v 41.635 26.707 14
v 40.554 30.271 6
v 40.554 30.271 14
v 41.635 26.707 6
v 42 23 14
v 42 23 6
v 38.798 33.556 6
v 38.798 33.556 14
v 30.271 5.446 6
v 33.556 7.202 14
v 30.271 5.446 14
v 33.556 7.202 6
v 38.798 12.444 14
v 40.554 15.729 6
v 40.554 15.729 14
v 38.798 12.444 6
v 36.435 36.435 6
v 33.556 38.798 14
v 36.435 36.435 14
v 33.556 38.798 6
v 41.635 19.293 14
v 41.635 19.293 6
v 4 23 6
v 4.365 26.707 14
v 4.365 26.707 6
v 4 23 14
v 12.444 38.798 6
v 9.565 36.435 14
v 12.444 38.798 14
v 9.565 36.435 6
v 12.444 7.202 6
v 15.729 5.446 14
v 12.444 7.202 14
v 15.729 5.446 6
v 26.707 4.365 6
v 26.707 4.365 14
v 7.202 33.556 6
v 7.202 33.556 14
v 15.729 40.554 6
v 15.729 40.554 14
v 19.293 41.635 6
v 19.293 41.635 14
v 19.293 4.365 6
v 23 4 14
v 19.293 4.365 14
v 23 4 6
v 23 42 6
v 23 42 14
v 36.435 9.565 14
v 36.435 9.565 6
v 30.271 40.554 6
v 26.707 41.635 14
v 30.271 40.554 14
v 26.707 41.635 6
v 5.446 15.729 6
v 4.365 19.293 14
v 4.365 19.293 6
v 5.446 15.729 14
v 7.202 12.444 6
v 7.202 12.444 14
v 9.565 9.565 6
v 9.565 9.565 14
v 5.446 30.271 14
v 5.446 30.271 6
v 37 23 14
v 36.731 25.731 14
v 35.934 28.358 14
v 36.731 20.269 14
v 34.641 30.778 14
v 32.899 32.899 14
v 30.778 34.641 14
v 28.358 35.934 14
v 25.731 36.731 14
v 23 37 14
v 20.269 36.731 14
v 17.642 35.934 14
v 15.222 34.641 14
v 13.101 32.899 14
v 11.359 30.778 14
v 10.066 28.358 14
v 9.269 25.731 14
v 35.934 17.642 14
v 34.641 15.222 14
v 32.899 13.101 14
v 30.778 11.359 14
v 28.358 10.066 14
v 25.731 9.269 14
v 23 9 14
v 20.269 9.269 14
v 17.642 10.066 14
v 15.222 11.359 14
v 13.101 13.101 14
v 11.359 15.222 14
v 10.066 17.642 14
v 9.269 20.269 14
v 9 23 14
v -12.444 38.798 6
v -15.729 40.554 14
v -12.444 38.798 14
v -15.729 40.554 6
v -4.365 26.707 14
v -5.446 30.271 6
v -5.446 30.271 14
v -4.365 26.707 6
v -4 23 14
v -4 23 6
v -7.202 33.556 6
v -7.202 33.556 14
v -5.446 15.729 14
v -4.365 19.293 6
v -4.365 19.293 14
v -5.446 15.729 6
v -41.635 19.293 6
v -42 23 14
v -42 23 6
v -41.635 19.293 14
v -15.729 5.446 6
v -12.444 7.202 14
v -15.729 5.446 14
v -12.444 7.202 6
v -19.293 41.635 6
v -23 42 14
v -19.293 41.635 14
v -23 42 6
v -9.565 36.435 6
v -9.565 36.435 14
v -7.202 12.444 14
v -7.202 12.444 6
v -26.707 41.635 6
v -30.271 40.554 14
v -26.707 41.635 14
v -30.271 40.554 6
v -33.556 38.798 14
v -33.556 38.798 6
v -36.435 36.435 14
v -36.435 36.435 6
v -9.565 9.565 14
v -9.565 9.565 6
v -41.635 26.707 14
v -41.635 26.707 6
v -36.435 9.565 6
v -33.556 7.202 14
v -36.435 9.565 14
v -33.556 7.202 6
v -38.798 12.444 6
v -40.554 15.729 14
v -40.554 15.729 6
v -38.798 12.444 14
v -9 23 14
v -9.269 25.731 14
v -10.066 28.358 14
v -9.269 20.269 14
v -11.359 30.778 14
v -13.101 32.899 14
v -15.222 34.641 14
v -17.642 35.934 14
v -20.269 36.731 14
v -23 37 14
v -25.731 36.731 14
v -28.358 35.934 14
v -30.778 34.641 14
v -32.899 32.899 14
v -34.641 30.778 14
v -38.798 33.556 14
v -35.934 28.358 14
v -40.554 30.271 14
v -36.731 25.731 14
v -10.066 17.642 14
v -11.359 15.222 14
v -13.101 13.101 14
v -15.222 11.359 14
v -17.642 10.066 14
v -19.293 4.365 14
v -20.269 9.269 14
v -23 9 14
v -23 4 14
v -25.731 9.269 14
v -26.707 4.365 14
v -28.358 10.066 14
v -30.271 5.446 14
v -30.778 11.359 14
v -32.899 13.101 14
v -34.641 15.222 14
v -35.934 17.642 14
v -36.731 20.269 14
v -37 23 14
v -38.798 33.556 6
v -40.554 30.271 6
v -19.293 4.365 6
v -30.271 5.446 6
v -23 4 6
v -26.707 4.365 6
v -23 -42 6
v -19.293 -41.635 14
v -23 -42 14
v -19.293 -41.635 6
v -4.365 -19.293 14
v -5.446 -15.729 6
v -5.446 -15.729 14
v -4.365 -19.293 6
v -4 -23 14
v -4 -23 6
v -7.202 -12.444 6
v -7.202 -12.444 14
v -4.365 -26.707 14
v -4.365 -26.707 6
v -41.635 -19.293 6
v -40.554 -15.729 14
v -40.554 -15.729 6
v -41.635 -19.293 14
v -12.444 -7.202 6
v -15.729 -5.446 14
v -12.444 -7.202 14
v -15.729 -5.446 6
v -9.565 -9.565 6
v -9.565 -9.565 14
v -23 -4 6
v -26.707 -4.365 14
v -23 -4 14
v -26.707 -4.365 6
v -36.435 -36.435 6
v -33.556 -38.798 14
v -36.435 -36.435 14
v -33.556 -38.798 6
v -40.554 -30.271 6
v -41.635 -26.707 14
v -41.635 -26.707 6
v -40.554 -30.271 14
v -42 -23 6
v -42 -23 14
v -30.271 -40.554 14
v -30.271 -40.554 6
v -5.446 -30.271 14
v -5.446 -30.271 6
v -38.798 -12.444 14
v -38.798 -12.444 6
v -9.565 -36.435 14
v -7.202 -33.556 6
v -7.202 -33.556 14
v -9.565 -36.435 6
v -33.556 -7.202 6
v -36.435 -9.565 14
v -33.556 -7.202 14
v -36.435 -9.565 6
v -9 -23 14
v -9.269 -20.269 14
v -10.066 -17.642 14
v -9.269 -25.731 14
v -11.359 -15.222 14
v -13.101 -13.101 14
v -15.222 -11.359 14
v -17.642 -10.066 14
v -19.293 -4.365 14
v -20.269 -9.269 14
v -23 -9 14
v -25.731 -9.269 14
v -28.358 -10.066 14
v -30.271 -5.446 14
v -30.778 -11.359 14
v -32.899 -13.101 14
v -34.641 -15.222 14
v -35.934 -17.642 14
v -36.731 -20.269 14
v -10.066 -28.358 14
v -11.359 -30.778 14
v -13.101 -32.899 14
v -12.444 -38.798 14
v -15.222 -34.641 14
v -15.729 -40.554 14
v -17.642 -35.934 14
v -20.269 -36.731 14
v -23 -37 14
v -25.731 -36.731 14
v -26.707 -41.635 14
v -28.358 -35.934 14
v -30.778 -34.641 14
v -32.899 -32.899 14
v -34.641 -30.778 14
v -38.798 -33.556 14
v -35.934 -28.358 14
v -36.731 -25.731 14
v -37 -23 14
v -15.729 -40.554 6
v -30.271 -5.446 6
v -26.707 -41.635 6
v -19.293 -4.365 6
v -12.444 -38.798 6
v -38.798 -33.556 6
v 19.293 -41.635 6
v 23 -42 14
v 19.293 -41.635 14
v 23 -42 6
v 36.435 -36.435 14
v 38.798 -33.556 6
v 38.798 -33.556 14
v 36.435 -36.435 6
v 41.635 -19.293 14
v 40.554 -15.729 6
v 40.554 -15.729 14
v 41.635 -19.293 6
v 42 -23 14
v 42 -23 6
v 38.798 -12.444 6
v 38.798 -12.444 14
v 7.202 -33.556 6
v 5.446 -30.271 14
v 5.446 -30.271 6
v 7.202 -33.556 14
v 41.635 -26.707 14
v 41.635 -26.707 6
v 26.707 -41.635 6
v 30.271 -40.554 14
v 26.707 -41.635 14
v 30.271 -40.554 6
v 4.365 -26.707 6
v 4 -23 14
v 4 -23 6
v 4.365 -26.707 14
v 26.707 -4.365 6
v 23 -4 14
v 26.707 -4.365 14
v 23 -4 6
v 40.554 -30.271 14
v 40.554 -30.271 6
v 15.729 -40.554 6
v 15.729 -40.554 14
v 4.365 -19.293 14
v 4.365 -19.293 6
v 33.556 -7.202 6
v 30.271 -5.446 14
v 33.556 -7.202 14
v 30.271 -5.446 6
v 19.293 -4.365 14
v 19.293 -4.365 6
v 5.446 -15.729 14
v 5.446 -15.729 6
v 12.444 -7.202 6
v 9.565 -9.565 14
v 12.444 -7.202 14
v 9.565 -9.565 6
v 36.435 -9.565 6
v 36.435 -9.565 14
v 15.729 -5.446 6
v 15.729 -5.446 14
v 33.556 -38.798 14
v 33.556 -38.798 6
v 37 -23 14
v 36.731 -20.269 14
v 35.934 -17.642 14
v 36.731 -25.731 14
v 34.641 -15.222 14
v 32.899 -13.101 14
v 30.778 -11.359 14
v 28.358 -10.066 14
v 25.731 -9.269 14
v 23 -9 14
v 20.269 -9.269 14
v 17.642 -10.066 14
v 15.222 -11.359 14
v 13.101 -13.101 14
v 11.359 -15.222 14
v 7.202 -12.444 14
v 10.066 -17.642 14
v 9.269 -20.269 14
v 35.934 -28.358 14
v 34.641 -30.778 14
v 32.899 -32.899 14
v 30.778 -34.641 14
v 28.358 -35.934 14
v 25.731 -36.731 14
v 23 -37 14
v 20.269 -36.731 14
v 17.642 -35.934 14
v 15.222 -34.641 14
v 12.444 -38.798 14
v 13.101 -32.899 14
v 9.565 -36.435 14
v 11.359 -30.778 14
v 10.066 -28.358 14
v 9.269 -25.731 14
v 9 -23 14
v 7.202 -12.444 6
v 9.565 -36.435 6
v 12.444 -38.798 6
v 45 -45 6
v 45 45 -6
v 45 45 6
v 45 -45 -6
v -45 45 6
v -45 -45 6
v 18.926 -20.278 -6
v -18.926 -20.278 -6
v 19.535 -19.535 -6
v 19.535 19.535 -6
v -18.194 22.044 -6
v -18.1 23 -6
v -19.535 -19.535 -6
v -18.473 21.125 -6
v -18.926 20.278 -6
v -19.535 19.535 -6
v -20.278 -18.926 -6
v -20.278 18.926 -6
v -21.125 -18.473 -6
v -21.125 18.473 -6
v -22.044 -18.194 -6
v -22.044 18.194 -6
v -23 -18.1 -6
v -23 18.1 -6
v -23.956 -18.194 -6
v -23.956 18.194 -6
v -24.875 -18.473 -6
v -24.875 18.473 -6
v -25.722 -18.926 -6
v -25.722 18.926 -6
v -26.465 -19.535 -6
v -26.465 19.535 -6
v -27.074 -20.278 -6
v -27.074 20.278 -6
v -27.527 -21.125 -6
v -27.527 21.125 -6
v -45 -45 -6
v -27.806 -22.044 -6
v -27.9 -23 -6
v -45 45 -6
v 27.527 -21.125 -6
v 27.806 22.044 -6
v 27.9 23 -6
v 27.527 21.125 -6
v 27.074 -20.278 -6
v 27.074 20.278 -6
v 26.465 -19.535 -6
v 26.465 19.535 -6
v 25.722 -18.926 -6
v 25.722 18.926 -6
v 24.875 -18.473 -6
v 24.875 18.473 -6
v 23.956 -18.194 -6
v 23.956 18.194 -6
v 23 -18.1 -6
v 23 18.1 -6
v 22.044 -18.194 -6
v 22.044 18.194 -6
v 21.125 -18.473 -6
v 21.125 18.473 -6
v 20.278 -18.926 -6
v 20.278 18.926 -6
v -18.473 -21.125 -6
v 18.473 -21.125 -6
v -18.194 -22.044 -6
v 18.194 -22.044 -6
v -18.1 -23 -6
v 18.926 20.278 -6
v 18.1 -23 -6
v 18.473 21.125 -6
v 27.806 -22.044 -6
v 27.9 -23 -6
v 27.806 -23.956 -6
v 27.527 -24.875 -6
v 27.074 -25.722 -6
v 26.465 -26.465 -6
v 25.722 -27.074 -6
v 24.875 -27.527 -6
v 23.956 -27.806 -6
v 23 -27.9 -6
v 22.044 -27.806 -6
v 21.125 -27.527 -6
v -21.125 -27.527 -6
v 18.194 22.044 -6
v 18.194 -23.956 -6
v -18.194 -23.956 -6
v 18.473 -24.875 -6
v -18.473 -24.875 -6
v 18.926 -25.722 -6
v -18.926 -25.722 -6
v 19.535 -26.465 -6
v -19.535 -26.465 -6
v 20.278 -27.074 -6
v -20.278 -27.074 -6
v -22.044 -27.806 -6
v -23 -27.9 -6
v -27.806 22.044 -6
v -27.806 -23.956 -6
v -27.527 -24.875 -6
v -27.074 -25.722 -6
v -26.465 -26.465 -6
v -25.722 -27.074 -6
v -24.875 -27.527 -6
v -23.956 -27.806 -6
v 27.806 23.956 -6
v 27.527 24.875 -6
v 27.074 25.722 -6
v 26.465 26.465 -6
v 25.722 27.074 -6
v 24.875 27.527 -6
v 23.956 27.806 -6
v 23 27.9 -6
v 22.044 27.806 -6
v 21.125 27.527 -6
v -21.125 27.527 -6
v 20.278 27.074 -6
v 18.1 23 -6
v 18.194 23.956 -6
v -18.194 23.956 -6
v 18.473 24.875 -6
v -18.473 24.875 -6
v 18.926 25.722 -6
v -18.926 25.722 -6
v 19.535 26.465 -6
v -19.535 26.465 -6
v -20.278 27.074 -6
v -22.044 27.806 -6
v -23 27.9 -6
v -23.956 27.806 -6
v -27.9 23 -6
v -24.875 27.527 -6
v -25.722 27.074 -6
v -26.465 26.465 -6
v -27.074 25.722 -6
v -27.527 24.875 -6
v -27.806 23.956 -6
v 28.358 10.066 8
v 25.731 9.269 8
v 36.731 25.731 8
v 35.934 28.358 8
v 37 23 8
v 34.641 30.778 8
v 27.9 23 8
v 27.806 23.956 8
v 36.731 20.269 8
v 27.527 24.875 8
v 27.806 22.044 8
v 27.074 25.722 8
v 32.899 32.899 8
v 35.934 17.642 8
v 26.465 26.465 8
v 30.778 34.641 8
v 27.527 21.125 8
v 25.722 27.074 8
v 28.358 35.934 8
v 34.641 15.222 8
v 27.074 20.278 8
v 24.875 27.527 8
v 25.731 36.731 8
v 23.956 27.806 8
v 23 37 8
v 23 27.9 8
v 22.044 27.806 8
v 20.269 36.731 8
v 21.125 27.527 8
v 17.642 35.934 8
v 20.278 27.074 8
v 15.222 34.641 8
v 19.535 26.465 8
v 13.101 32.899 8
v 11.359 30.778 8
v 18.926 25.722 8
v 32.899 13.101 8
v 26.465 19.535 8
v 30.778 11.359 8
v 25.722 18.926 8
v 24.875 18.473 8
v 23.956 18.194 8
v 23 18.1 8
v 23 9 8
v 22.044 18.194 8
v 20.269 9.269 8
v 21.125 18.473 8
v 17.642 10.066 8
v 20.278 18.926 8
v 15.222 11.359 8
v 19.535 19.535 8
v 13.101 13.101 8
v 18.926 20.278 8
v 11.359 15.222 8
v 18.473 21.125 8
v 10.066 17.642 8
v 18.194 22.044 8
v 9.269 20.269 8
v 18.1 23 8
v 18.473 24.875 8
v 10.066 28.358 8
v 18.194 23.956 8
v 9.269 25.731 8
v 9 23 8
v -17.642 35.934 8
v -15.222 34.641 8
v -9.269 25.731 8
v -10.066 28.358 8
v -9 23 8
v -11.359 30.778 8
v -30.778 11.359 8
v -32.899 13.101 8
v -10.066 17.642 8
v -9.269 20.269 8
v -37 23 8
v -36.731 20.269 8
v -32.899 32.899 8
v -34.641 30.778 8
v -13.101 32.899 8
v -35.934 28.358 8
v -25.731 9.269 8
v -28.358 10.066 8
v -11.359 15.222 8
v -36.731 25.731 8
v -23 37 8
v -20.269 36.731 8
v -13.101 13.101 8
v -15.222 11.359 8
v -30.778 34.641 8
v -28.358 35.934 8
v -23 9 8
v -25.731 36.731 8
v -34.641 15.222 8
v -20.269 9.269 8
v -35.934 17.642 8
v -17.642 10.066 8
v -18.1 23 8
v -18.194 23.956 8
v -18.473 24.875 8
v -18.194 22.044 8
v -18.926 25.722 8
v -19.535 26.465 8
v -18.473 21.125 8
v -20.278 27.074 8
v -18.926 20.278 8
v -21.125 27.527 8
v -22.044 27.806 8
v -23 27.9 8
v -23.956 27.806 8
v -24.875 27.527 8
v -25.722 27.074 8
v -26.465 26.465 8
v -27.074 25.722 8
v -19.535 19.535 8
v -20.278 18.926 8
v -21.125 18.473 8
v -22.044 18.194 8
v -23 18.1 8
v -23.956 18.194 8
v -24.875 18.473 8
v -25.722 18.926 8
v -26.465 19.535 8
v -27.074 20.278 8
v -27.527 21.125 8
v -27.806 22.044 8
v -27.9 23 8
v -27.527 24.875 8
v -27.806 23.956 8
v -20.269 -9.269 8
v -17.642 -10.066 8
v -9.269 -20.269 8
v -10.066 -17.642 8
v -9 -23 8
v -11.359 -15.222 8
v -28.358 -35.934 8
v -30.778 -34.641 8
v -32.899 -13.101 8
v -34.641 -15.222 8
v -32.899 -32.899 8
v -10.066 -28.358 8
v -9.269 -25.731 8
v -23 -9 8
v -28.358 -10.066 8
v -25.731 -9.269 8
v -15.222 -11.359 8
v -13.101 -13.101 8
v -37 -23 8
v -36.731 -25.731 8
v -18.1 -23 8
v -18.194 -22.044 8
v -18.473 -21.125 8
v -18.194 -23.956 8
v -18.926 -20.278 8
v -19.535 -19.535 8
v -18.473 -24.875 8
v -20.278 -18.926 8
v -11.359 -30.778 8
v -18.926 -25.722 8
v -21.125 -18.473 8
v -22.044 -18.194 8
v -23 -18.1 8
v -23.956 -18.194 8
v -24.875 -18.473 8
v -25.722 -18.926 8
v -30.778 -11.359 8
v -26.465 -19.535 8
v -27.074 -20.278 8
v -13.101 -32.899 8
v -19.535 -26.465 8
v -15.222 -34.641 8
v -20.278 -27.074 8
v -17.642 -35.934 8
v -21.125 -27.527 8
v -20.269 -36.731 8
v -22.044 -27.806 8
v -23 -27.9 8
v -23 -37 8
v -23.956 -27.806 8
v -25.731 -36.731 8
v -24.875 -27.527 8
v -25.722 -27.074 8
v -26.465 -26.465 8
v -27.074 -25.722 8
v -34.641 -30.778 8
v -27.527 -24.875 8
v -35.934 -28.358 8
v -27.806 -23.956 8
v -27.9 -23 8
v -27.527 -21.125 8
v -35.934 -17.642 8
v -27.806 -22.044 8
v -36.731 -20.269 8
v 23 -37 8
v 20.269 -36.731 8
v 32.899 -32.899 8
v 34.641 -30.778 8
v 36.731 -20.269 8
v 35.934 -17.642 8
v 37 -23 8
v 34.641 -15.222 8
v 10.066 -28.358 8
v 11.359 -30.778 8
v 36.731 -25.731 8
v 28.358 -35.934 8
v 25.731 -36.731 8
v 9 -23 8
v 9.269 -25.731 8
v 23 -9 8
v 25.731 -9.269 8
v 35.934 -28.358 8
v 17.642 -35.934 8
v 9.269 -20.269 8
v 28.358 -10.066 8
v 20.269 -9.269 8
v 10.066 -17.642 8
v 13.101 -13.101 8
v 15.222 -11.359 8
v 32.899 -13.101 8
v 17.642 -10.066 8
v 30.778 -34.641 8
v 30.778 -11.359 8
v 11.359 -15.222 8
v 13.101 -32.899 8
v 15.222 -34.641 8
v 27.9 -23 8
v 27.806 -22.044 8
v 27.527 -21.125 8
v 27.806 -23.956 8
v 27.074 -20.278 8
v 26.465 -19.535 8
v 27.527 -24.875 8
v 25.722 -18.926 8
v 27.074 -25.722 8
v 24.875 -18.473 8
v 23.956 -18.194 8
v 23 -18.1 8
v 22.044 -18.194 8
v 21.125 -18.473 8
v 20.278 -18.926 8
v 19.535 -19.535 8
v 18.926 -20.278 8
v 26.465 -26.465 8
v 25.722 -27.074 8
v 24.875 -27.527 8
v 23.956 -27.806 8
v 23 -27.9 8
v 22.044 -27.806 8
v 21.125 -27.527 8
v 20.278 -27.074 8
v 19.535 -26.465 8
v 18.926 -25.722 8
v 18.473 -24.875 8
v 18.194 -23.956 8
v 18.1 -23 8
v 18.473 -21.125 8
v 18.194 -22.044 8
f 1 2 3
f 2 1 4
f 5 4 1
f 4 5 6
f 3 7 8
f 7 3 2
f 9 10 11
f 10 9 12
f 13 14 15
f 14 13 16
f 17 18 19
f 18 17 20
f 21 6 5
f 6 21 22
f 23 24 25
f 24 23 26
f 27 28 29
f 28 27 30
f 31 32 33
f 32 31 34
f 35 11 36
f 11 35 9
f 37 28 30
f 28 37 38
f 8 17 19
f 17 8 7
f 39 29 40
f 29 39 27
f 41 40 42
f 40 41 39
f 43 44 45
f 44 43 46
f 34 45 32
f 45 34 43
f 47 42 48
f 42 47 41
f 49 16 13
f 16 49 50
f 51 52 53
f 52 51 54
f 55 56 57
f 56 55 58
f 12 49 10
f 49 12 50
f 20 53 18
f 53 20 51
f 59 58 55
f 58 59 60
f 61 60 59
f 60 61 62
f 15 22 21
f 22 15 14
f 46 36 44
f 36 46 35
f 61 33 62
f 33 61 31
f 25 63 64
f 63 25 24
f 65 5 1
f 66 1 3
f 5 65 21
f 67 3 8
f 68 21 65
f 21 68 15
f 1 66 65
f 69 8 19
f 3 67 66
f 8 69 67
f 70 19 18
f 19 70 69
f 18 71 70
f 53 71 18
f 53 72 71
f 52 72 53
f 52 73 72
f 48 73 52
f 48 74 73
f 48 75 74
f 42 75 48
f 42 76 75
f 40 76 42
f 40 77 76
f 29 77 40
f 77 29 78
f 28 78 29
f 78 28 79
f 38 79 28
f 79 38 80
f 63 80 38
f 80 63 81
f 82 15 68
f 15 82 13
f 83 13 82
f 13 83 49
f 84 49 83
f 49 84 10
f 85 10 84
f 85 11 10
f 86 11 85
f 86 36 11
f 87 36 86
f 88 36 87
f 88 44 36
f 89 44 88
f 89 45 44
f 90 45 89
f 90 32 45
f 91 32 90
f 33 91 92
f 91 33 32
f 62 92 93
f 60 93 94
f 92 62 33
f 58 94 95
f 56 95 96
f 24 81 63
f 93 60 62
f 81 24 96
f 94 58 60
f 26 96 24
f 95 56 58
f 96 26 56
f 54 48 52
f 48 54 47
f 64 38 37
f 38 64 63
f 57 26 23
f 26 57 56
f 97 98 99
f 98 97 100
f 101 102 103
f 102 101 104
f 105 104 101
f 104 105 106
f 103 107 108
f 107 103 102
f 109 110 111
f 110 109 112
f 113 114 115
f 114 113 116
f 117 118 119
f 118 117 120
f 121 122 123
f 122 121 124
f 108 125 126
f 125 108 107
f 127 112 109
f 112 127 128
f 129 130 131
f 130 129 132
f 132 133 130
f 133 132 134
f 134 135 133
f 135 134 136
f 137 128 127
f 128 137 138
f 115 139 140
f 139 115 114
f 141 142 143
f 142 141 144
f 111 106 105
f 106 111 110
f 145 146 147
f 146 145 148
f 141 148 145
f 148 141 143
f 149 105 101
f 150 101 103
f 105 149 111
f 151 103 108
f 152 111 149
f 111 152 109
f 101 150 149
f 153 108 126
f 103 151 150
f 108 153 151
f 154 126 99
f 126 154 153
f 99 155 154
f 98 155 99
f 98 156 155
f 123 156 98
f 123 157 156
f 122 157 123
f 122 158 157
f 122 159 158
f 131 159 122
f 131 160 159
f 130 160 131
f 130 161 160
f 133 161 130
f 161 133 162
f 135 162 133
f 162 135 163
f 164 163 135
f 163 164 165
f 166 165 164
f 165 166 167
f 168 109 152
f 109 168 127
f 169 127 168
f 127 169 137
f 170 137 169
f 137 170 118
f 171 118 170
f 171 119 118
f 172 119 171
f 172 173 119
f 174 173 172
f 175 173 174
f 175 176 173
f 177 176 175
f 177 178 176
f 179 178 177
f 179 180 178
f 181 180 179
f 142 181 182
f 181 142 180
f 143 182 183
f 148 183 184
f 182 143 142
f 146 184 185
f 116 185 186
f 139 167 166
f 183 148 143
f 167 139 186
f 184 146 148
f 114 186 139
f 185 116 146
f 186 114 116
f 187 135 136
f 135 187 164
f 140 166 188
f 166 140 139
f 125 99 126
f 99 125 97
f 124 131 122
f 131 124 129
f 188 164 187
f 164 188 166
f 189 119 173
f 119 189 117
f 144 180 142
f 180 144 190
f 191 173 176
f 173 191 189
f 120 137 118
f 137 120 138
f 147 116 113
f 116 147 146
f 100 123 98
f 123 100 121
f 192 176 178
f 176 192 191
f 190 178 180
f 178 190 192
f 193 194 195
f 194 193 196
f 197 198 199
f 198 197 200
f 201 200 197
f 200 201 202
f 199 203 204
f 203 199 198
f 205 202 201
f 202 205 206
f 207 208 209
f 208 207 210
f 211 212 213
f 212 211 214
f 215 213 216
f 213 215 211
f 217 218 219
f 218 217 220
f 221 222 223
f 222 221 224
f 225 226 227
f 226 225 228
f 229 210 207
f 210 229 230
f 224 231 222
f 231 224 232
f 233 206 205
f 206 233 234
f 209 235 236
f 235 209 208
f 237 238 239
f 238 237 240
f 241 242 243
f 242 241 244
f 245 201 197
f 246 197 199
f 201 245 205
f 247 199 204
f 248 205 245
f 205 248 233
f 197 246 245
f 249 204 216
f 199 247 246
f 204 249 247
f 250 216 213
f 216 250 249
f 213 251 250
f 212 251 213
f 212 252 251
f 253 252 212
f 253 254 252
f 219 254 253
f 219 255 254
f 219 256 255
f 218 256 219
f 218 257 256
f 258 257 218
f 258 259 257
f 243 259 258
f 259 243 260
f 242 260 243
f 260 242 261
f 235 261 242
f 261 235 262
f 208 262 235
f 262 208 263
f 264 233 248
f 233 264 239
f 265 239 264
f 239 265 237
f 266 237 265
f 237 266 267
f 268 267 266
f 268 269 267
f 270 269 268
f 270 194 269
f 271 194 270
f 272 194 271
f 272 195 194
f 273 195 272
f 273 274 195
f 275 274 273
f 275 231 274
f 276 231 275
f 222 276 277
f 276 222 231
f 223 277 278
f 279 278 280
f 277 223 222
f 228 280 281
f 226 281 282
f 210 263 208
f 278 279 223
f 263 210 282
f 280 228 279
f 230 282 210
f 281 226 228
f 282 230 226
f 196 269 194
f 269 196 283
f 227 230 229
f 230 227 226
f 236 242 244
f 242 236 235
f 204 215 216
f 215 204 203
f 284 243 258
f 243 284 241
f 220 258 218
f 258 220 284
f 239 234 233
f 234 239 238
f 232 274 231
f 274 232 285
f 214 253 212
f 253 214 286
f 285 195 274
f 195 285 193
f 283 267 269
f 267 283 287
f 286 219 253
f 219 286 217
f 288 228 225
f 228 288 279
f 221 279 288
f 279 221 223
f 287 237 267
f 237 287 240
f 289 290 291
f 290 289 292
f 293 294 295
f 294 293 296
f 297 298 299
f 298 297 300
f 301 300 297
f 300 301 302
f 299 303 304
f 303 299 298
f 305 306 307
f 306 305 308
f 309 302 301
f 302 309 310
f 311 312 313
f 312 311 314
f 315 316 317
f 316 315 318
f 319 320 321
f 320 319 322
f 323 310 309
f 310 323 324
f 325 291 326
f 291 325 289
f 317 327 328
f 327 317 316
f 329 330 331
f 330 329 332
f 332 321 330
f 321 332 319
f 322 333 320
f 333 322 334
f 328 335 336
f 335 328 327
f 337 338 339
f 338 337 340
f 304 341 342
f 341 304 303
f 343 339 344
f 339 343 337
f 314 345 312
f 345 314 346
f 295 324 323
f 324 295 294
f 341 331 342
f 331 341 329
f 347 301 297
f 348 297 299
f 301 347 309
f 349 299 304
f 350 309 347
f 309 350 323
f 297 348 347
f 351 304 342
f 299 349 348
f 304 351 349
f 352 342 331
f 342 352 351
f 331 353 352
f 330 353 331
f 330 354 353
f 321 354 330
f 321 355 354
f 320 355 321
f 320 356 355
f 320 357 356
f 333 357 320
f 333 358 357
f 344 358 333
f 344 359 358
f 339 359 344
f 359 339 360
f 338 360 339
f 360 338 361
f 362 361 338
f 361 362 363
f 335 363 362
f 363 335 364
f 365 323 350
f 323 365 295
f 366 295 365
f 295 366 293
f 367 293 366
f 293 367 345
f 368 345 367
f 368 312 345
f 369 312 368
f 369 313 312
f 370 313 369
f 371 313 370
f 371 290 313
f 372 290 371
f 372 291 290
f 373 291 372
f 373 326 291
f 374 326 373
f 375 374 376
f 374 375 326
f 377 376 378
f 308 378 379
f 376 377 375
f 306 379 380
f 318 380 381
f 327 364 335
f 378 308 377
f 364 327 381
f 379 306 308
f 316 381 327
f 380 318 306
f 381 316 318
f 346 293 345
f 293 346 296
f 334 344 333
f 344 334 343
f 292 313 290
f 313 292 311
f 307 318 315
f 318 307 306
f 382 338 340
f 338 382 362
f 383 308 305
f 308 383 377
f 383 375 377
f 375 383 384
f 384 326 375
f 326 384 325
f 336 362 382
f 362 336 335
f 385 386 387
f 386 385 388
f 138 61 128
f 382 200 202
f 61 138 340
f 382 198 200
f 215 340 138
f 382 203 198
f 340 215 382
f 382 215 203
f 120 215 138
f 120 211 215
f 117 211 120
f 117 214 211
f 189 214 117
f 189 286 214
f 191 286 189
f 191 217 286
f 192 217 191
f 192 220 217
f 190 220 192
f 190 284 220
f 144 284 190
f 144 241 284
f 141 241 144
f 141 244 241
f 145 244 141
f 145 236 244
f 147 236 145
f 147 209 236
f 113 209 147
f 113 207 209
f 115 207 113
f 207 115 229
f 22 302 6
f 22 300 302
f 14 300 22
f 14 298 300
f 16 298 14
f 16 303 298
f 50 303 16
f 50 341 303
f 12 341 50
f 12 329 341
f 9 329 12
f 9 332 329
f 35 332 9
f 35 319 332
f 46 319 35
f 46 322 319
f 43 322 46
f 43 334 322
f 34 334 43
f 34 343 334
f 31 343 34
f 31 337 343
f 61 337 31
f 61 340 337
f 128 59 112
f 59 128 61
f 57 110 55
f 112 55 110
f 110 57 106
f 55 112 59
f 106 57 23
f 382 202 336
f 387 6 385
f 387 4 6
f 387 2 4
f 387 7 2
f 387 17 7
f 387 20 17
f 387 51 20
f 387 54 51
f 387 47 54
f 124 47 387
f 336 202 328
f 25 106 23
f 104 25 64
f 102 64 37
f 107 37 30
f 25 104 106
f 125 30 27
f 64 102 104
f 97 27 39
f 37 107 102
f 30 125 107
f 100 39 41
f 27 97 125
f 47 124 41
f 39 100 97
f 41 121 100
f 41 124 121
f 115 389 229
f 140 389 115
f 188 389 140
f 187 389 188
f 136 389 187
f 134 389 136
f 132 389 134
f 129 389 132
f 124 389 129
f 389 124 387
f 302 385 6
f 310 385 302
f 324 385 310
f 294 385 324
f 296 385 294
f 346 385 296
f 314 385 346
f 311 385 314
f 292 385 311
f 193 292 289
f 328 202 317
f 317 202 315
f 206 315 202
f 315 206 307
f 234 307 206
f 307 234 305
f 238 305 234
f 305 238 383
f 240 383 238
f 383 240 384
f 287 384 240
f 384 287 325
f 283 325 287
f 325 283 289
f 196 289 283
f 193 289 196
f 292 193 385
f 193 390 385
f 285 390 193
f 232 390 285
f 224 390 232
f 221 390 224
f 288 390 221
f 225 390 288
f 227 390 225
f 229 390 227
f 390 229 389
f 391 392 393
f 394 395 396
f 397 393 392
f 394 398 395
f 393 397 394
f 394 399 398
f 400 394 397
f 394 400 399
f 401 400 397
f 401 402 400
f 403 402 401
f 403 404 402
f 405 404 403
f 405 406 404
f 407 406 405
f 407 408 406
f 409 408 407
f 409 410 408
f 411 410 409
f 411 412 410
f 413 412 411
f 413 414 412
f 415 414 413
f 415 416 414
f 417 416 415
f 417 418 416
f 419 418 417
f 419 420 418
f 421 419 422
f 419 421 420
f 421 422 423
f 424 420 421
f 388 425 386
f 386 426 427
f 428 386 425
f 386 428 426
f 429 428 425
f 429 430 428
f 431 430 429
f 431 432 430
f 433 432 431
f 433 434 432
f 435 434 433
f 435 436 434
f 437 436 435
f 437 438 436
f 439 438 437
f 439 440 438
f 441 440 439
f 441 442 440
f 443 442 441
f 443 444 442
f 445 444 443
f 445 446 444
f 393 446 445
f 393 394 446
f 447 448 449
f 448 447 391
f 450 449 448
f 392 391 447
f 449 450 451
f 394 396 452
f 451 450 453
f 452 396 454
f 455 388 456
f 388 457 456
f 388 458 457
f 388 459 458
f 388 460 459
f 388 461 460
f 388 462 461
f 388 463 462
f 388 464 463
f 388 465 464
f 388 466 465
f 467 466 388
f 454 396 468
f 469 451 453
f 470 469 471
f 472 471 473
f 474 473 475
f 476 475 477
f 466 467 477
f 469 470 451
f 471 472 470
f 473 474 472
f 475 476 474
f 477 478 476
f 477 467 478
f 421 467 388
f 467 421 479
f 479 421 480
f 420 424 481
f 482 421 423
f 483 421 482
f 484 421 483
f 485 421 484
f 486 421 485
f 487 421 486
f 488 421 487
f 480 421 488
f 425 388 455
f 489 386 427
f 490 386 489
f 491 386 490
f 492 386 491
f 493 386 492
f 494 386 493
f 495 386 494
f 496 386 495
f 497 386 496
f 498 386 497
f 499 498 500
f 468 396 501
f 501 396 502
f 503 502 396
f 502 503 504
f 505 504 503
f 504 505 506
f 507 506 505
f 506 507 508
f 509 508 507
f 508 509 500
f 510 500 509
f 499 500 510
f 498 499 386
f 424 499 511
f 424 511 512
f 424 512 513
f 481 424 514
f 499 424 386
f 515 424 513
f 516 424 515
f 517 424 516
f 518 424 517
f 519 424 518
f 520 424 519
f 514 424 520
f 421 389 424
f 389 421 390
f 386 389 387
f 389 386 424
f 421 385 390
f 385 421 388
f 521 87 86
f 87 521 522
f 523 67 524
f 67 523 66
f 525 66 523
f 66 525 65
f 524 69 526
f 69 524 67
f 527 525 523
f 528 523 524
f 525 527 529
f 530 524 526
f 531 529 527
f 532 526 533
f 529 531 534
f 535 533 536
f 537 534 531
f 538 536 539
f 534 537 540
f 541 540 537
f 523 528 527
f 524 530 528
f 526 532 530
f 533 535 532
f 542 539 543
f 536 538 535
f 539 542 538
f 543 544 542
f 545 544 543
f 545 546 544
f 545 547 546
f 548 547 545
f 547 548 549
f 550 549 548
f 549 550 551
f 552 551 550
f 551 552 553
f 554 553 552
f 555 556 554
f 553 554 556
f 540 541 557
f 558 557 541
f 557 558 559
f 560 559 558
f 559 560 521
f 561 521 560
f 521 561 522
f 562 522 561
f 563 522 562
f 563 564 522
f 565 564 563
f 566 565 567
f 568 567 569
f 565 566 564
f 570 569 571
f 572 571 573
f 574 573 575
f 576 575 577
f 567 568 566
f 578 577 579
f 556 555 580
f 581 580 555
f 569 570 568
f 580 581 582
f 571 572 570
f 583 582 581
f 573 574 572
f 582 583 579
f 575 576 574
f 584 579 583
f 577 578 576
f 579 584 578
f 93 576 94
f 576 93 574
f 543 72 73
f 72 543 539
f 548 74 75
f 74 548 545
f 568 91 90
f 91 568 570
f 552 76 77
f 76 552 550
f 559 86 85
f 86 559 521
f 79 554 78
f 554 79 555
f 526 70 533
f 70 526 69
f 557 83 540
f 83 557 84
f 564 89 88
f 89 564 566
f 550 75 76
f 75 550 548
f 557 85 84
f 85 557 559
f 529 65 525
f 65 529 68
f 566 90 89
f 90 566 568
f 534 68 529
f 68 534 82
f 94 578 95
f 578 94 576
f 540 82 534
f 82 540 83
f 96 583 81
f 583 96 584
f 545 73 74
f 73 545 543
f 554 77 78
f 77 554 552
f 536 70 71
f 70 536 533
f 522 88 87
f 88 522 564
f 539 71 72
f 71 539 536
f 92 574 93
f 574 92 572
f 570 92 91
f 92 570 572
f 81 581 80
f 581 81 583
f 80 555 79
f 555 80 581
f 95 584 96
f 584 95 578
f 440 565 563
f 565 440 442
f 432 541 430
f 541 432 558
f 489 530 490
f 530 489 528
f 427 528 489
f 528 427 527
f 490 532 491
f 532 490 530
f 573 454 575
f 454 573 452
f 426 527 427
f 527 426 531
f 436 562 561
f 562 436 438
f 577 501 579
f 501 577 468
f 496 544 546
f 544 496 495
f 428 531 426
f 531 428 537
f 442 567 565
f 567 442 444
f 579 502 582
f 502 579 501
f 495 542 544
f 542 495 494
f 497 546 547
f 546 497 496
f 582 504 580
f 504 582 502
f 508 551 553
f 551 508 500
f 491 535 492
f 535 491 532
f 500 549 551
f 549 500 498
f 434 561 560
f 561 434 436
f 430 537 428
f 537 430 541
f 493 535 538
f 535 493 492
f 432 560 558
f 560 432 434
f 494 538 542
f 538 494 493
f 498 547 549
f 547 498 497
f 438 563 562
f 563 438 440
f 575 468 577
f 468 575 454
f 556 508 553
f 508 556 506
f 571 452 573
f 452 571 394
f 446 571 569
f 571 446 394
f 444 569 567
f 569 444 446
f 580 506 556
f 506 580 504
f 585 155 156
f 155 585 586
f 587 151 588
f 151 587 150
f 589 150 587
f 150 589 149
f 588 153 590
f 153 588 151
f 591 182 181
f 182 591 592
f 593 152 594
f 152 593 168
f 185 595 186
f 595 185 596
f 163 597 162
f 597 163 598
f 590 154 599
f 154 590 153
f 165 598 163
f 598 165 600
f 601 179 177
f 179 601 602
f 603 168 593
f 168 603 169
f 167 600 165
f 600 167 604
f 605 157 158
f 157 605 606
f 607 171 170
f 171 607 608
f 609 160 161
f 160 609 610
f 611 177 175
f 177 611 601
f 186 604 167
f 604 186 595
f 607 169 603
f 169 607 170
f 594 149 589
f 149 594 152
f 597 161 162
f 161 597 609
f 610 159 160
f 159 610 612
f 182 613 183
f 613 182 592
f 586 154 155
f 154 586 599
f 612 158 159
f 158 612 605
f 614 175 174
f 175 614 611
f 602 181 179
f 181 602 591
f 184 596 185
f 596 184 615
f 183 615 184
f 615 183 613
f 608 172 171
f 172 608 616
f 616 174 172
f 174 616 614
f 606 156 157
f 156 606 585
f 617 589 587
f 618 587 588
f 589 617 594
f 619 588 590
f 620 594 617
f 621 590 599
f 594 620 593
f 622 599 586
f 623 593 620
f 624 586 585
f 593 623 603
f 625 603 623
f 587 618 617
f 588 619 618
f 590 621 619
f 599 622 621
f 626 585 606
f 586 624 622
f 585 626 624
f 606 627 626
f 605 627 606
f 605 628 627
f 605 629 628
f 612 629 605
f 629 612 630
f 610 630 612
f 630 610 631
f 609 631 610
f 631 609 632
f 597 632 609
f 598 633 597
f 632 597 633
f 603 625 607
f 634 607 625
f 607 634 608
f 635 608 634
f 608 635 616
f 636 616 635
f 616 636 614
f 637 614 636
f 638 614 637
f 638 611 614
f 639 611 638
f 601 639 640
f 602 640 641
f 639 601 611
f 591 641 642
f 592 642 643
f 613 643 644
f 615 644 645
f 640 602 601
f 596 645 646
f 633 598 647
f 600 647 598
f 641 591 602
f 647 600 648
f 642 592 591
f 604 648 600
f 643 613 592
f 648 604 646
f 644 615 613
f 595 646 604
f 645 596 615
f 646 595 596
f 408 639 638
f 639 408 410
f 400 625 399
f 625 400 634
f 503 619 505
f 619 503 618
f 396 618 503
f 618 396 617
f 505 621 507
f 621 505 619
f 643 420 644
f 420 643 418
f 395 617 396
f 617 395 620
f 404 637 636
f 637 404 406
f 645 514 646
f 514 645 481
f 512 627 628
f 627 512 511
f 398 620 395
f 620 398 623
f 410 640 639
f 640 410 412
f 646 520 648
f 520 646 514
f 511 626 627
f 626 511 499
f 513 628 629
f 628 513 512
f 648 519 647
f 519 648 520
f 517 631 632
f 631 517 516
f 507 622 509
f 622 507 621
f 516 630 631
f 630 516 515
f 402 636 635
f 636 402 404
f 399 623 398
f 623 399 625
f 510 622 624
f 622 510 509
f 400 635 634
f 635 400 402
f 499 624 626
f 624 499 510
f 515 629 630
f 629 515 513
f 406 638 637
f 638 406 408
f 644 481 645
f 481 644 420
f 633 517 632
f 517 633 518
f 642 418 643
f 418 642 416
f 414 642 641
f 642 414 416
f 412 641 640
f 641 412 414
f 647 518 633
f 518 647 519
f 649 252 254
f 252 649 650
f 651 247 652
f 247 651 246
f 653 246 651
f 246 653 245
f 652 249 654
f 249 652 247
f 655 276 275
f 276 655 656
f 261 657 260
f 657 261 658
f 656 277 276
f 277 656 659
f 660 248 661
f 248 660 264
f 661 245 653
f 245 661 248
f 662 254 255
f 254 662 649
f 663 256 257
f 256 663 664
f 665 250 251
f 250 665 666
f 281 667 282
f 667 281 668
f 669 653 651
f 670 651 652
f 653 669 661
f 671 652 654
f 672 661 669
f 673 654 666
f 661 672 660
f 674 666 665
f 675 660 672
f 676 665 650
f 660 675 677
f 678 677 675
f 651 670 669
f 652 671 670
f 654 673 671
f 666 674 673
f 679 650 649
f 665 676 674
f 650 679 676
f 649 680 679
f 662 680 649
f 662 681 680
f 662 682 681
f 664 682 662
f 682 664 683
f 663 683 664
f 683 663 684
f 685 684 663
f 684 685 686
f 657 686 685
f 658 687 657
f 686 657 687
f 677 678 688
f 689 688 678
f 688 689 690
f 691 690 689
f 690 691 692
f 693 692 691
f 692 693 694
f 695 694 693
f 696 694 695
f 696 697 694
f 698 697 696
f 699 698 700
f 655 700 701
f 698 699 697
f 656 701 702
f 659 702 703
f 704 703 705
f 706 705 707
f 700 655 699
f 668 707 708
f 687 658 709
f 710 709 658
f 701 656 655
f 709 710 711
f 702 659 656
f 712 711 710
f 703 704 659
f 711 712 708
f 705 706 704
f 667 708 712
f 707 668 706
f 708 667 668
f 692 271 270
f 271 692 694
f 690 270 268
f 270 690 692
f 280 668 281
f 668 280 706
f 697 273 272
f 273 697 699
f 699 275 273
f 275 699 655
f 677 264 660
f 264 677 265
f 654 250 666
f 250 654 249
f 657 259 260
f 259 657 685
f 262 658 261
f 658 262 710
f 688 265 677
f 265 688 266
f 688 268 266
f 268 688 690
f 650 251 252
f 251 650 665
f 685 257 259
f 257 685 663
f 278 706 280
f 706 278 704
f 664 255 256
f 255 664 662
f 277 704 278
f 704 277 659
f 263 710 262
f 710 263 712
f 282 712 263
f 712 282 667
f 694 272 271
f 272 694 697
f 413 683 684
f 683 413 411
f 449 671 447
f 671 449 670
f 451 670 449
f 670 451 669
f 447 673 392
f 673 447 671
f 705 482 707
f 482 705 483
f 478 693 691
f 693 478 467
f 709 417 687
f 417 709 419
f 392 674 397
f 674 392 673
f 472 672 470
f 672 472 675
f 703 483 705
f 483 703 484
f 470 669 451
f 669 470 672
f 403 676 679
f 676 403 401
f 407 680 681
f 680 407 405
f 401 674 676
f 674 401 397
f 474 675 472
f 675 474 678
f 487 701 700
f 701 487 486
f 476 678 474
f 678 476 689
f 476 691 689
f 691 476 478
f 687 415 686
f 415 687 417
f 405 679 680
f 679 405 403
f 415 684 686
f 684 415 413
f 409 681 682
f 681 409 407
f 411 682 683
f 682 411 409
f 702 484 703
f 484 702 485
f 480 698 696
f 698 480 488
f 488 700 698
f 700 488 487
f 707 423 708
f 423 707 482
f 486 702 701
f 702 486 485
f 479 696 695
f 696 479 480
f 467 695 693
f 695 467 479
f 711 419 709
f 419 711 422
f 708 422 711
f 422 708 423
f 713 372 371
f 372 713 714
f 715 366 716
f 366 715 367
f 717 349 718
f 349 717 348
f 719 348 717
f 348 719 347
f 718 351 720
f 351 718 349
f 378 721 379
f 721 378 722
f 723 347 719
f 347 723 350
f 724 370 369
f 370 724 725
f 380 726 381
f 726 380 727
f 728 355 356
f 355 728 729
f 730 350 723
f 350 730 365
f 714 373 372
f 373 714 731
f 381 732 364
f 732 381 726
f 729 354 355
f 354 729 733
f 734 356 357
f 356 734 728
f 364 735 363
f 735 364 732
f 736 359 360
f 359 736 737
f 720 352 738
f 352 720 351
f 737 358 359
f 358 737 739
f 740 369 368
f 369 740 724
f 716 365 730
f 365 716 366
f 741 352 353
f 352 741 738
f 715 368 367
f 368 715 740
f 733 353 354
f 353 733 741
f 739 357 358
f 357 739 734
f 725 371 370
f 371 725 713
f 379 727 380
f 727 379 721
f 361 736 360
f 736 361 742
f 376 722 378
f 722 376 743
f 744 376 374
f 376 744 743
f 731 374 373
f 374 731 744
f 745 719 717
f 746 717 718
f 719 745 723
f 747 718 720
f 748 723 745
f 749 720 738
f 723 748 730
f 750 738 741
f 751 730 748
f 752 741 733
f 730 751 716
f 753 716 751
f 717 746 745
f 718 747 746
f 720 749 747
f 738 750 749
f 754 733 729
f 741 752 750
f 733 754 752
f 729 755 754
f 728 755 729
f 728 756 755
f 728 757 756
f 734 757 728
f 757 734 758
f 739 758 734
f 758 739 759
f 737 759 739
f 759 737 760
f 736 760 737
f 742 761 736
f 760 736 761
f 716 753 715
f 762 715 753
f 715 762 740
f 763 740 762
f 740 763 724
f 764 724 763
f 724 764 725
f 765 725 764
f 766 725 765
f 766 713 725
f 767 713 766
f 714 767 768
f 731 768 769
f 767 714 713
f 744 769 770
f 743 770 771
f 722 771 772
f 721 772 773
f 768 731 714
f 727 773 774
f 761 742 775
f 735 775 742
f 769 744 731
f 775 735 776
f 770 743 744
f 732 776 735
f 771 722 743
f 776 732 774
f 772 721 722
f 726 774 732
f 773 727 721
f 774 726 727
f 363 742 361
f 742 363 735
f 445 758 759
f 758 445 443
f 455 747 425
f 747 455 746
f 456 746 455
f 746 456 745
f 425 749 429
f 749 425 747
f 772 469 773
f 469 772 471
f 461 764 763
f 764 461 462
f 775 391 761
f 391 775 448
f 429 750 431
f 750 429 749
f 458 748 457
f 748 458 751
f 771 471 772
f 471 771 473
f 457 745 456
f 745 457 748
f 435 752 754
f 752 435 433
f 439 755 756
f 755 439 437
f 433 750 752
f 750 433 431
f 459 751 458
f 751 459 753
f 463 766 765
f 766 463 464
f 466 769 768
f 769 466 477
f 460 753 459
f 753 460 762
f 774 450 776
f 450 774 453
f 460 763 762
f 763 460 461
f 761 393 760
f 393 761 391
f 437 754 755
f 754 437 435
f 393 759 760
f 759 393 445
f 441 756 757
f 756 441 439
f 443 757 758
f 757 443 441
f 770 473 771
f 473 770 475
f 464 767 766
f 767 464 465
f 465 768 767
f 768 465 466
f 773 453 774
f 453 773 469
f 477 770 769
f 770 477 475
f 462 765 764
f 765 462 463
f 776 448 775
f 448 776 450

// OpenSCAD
$fn = 32;

// ----------------------------------------------------------------------
// Socket pad plate
// bosses with counterbored sockets for the screws
// ----------------------------------------------------------------------

// --- parameters (mm) ---
base_t = 12;           // base plate thickness
boss_h = 8;            // boss height above the base plate
boss_d = 38;           // boss diameter
socket_d = 28;         // socket diameter
socket_depth = 6;      // socket depth from the boss face
bolt_d = 9.8;          // screw clearance hole through the socket floor
plate = [90, 90, 12];  // overall size (x, y, z)
edge = 22;             // boss centre offset from the plate edge
pads = 4;              // boss count, one per corner

// --- derived feature positions (mm) ---
height = base_t + boss_h;        // = 20   overall height of the part
corner_x = plate[0] / 2 - edge;  // = 23   boss centre X
corner_y = plate[1] / 2 - edge;  // = 23   boss centre Y
feature_centers = [
  [corner_x, corner_y],
  [-corner_x, corner_y],
  [-corner_x, -corner_y],
  [corner_x, -corner_y]
];   // boss centres: sockets, holes and the pads themselves are placed from here

// base plate, bosses on feature_centers, socket + through hole in each
difference() {
  union() {
    cube(plate, center = true);
    for (centre = feature_centers)
      translate([centre[0], centre[1], plate[2] / 2 - 1])
        cylinder(d = boss_d, h = boss_h + 1);
  }
  for (centre = feature_centers) {
    translate([centre[0], centre[1], plate[2] / 2 + boss_h - socket_depth])
      cylinder(d = socket_d, h = socket_depth + 1);
    translate([centre[0], centre[1], -height])
      cylinder(d = bolt_d, h = 2 * height + 2);  // through the socket floor
  }
}
